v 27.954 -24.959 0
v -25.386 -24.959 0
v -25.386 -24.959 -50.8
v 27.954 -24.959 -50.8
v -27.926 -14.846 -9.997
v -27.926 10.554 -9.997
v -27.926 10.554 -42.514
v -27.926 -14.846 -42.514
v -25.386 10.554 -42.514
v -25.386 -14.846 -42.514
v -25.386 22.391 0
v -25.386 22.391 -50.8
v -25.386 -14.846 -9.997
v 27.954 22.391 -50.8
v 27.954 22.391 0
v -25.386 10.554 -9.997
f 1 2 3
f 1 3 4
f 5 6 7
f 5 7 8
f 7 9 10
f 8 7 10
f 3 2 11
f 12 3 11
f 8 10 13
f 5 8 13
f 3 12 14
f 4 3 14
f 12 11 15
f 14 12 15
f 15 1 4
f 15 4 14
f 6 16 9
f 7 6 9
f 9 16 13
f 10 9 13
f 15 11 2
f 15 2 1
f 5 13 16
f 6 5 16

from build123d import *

# Parameters (mm, degrees)
F0_W     = 53.339999
F0_H     = 47.349947
F1_DEPTH = 50.8
F3_DEPTH = 2.54


with BuildPart() as f1:
    # F0 (on Top) → F1 (new body)
    with BuildSketch(Plane.XY):
        with Locations((1.283582, -1.283584)):
            Rectangle(F0_W, F0_H)
    extrude(amount=-F1_DEPTH)


with BuildPart() as f3:
    # F2 (on face) → F3 (new body)
    with BuildSketch(Plane(origin=(-25.386417, 0, 0), x_dir=(0, -1, 0), z_dir=(-1, 0, 0))):
        Polygon((-10.553902, -9.997003), (-10.553902, -42.514436), (0, -42.514436), (2.146098, -42.514436), (14.846098, -42.514436), (14.846098, -9.997003), align=None)
    extrude(amount=F3_DEPTH)


solid = Compound([f1.part, f3.part])
